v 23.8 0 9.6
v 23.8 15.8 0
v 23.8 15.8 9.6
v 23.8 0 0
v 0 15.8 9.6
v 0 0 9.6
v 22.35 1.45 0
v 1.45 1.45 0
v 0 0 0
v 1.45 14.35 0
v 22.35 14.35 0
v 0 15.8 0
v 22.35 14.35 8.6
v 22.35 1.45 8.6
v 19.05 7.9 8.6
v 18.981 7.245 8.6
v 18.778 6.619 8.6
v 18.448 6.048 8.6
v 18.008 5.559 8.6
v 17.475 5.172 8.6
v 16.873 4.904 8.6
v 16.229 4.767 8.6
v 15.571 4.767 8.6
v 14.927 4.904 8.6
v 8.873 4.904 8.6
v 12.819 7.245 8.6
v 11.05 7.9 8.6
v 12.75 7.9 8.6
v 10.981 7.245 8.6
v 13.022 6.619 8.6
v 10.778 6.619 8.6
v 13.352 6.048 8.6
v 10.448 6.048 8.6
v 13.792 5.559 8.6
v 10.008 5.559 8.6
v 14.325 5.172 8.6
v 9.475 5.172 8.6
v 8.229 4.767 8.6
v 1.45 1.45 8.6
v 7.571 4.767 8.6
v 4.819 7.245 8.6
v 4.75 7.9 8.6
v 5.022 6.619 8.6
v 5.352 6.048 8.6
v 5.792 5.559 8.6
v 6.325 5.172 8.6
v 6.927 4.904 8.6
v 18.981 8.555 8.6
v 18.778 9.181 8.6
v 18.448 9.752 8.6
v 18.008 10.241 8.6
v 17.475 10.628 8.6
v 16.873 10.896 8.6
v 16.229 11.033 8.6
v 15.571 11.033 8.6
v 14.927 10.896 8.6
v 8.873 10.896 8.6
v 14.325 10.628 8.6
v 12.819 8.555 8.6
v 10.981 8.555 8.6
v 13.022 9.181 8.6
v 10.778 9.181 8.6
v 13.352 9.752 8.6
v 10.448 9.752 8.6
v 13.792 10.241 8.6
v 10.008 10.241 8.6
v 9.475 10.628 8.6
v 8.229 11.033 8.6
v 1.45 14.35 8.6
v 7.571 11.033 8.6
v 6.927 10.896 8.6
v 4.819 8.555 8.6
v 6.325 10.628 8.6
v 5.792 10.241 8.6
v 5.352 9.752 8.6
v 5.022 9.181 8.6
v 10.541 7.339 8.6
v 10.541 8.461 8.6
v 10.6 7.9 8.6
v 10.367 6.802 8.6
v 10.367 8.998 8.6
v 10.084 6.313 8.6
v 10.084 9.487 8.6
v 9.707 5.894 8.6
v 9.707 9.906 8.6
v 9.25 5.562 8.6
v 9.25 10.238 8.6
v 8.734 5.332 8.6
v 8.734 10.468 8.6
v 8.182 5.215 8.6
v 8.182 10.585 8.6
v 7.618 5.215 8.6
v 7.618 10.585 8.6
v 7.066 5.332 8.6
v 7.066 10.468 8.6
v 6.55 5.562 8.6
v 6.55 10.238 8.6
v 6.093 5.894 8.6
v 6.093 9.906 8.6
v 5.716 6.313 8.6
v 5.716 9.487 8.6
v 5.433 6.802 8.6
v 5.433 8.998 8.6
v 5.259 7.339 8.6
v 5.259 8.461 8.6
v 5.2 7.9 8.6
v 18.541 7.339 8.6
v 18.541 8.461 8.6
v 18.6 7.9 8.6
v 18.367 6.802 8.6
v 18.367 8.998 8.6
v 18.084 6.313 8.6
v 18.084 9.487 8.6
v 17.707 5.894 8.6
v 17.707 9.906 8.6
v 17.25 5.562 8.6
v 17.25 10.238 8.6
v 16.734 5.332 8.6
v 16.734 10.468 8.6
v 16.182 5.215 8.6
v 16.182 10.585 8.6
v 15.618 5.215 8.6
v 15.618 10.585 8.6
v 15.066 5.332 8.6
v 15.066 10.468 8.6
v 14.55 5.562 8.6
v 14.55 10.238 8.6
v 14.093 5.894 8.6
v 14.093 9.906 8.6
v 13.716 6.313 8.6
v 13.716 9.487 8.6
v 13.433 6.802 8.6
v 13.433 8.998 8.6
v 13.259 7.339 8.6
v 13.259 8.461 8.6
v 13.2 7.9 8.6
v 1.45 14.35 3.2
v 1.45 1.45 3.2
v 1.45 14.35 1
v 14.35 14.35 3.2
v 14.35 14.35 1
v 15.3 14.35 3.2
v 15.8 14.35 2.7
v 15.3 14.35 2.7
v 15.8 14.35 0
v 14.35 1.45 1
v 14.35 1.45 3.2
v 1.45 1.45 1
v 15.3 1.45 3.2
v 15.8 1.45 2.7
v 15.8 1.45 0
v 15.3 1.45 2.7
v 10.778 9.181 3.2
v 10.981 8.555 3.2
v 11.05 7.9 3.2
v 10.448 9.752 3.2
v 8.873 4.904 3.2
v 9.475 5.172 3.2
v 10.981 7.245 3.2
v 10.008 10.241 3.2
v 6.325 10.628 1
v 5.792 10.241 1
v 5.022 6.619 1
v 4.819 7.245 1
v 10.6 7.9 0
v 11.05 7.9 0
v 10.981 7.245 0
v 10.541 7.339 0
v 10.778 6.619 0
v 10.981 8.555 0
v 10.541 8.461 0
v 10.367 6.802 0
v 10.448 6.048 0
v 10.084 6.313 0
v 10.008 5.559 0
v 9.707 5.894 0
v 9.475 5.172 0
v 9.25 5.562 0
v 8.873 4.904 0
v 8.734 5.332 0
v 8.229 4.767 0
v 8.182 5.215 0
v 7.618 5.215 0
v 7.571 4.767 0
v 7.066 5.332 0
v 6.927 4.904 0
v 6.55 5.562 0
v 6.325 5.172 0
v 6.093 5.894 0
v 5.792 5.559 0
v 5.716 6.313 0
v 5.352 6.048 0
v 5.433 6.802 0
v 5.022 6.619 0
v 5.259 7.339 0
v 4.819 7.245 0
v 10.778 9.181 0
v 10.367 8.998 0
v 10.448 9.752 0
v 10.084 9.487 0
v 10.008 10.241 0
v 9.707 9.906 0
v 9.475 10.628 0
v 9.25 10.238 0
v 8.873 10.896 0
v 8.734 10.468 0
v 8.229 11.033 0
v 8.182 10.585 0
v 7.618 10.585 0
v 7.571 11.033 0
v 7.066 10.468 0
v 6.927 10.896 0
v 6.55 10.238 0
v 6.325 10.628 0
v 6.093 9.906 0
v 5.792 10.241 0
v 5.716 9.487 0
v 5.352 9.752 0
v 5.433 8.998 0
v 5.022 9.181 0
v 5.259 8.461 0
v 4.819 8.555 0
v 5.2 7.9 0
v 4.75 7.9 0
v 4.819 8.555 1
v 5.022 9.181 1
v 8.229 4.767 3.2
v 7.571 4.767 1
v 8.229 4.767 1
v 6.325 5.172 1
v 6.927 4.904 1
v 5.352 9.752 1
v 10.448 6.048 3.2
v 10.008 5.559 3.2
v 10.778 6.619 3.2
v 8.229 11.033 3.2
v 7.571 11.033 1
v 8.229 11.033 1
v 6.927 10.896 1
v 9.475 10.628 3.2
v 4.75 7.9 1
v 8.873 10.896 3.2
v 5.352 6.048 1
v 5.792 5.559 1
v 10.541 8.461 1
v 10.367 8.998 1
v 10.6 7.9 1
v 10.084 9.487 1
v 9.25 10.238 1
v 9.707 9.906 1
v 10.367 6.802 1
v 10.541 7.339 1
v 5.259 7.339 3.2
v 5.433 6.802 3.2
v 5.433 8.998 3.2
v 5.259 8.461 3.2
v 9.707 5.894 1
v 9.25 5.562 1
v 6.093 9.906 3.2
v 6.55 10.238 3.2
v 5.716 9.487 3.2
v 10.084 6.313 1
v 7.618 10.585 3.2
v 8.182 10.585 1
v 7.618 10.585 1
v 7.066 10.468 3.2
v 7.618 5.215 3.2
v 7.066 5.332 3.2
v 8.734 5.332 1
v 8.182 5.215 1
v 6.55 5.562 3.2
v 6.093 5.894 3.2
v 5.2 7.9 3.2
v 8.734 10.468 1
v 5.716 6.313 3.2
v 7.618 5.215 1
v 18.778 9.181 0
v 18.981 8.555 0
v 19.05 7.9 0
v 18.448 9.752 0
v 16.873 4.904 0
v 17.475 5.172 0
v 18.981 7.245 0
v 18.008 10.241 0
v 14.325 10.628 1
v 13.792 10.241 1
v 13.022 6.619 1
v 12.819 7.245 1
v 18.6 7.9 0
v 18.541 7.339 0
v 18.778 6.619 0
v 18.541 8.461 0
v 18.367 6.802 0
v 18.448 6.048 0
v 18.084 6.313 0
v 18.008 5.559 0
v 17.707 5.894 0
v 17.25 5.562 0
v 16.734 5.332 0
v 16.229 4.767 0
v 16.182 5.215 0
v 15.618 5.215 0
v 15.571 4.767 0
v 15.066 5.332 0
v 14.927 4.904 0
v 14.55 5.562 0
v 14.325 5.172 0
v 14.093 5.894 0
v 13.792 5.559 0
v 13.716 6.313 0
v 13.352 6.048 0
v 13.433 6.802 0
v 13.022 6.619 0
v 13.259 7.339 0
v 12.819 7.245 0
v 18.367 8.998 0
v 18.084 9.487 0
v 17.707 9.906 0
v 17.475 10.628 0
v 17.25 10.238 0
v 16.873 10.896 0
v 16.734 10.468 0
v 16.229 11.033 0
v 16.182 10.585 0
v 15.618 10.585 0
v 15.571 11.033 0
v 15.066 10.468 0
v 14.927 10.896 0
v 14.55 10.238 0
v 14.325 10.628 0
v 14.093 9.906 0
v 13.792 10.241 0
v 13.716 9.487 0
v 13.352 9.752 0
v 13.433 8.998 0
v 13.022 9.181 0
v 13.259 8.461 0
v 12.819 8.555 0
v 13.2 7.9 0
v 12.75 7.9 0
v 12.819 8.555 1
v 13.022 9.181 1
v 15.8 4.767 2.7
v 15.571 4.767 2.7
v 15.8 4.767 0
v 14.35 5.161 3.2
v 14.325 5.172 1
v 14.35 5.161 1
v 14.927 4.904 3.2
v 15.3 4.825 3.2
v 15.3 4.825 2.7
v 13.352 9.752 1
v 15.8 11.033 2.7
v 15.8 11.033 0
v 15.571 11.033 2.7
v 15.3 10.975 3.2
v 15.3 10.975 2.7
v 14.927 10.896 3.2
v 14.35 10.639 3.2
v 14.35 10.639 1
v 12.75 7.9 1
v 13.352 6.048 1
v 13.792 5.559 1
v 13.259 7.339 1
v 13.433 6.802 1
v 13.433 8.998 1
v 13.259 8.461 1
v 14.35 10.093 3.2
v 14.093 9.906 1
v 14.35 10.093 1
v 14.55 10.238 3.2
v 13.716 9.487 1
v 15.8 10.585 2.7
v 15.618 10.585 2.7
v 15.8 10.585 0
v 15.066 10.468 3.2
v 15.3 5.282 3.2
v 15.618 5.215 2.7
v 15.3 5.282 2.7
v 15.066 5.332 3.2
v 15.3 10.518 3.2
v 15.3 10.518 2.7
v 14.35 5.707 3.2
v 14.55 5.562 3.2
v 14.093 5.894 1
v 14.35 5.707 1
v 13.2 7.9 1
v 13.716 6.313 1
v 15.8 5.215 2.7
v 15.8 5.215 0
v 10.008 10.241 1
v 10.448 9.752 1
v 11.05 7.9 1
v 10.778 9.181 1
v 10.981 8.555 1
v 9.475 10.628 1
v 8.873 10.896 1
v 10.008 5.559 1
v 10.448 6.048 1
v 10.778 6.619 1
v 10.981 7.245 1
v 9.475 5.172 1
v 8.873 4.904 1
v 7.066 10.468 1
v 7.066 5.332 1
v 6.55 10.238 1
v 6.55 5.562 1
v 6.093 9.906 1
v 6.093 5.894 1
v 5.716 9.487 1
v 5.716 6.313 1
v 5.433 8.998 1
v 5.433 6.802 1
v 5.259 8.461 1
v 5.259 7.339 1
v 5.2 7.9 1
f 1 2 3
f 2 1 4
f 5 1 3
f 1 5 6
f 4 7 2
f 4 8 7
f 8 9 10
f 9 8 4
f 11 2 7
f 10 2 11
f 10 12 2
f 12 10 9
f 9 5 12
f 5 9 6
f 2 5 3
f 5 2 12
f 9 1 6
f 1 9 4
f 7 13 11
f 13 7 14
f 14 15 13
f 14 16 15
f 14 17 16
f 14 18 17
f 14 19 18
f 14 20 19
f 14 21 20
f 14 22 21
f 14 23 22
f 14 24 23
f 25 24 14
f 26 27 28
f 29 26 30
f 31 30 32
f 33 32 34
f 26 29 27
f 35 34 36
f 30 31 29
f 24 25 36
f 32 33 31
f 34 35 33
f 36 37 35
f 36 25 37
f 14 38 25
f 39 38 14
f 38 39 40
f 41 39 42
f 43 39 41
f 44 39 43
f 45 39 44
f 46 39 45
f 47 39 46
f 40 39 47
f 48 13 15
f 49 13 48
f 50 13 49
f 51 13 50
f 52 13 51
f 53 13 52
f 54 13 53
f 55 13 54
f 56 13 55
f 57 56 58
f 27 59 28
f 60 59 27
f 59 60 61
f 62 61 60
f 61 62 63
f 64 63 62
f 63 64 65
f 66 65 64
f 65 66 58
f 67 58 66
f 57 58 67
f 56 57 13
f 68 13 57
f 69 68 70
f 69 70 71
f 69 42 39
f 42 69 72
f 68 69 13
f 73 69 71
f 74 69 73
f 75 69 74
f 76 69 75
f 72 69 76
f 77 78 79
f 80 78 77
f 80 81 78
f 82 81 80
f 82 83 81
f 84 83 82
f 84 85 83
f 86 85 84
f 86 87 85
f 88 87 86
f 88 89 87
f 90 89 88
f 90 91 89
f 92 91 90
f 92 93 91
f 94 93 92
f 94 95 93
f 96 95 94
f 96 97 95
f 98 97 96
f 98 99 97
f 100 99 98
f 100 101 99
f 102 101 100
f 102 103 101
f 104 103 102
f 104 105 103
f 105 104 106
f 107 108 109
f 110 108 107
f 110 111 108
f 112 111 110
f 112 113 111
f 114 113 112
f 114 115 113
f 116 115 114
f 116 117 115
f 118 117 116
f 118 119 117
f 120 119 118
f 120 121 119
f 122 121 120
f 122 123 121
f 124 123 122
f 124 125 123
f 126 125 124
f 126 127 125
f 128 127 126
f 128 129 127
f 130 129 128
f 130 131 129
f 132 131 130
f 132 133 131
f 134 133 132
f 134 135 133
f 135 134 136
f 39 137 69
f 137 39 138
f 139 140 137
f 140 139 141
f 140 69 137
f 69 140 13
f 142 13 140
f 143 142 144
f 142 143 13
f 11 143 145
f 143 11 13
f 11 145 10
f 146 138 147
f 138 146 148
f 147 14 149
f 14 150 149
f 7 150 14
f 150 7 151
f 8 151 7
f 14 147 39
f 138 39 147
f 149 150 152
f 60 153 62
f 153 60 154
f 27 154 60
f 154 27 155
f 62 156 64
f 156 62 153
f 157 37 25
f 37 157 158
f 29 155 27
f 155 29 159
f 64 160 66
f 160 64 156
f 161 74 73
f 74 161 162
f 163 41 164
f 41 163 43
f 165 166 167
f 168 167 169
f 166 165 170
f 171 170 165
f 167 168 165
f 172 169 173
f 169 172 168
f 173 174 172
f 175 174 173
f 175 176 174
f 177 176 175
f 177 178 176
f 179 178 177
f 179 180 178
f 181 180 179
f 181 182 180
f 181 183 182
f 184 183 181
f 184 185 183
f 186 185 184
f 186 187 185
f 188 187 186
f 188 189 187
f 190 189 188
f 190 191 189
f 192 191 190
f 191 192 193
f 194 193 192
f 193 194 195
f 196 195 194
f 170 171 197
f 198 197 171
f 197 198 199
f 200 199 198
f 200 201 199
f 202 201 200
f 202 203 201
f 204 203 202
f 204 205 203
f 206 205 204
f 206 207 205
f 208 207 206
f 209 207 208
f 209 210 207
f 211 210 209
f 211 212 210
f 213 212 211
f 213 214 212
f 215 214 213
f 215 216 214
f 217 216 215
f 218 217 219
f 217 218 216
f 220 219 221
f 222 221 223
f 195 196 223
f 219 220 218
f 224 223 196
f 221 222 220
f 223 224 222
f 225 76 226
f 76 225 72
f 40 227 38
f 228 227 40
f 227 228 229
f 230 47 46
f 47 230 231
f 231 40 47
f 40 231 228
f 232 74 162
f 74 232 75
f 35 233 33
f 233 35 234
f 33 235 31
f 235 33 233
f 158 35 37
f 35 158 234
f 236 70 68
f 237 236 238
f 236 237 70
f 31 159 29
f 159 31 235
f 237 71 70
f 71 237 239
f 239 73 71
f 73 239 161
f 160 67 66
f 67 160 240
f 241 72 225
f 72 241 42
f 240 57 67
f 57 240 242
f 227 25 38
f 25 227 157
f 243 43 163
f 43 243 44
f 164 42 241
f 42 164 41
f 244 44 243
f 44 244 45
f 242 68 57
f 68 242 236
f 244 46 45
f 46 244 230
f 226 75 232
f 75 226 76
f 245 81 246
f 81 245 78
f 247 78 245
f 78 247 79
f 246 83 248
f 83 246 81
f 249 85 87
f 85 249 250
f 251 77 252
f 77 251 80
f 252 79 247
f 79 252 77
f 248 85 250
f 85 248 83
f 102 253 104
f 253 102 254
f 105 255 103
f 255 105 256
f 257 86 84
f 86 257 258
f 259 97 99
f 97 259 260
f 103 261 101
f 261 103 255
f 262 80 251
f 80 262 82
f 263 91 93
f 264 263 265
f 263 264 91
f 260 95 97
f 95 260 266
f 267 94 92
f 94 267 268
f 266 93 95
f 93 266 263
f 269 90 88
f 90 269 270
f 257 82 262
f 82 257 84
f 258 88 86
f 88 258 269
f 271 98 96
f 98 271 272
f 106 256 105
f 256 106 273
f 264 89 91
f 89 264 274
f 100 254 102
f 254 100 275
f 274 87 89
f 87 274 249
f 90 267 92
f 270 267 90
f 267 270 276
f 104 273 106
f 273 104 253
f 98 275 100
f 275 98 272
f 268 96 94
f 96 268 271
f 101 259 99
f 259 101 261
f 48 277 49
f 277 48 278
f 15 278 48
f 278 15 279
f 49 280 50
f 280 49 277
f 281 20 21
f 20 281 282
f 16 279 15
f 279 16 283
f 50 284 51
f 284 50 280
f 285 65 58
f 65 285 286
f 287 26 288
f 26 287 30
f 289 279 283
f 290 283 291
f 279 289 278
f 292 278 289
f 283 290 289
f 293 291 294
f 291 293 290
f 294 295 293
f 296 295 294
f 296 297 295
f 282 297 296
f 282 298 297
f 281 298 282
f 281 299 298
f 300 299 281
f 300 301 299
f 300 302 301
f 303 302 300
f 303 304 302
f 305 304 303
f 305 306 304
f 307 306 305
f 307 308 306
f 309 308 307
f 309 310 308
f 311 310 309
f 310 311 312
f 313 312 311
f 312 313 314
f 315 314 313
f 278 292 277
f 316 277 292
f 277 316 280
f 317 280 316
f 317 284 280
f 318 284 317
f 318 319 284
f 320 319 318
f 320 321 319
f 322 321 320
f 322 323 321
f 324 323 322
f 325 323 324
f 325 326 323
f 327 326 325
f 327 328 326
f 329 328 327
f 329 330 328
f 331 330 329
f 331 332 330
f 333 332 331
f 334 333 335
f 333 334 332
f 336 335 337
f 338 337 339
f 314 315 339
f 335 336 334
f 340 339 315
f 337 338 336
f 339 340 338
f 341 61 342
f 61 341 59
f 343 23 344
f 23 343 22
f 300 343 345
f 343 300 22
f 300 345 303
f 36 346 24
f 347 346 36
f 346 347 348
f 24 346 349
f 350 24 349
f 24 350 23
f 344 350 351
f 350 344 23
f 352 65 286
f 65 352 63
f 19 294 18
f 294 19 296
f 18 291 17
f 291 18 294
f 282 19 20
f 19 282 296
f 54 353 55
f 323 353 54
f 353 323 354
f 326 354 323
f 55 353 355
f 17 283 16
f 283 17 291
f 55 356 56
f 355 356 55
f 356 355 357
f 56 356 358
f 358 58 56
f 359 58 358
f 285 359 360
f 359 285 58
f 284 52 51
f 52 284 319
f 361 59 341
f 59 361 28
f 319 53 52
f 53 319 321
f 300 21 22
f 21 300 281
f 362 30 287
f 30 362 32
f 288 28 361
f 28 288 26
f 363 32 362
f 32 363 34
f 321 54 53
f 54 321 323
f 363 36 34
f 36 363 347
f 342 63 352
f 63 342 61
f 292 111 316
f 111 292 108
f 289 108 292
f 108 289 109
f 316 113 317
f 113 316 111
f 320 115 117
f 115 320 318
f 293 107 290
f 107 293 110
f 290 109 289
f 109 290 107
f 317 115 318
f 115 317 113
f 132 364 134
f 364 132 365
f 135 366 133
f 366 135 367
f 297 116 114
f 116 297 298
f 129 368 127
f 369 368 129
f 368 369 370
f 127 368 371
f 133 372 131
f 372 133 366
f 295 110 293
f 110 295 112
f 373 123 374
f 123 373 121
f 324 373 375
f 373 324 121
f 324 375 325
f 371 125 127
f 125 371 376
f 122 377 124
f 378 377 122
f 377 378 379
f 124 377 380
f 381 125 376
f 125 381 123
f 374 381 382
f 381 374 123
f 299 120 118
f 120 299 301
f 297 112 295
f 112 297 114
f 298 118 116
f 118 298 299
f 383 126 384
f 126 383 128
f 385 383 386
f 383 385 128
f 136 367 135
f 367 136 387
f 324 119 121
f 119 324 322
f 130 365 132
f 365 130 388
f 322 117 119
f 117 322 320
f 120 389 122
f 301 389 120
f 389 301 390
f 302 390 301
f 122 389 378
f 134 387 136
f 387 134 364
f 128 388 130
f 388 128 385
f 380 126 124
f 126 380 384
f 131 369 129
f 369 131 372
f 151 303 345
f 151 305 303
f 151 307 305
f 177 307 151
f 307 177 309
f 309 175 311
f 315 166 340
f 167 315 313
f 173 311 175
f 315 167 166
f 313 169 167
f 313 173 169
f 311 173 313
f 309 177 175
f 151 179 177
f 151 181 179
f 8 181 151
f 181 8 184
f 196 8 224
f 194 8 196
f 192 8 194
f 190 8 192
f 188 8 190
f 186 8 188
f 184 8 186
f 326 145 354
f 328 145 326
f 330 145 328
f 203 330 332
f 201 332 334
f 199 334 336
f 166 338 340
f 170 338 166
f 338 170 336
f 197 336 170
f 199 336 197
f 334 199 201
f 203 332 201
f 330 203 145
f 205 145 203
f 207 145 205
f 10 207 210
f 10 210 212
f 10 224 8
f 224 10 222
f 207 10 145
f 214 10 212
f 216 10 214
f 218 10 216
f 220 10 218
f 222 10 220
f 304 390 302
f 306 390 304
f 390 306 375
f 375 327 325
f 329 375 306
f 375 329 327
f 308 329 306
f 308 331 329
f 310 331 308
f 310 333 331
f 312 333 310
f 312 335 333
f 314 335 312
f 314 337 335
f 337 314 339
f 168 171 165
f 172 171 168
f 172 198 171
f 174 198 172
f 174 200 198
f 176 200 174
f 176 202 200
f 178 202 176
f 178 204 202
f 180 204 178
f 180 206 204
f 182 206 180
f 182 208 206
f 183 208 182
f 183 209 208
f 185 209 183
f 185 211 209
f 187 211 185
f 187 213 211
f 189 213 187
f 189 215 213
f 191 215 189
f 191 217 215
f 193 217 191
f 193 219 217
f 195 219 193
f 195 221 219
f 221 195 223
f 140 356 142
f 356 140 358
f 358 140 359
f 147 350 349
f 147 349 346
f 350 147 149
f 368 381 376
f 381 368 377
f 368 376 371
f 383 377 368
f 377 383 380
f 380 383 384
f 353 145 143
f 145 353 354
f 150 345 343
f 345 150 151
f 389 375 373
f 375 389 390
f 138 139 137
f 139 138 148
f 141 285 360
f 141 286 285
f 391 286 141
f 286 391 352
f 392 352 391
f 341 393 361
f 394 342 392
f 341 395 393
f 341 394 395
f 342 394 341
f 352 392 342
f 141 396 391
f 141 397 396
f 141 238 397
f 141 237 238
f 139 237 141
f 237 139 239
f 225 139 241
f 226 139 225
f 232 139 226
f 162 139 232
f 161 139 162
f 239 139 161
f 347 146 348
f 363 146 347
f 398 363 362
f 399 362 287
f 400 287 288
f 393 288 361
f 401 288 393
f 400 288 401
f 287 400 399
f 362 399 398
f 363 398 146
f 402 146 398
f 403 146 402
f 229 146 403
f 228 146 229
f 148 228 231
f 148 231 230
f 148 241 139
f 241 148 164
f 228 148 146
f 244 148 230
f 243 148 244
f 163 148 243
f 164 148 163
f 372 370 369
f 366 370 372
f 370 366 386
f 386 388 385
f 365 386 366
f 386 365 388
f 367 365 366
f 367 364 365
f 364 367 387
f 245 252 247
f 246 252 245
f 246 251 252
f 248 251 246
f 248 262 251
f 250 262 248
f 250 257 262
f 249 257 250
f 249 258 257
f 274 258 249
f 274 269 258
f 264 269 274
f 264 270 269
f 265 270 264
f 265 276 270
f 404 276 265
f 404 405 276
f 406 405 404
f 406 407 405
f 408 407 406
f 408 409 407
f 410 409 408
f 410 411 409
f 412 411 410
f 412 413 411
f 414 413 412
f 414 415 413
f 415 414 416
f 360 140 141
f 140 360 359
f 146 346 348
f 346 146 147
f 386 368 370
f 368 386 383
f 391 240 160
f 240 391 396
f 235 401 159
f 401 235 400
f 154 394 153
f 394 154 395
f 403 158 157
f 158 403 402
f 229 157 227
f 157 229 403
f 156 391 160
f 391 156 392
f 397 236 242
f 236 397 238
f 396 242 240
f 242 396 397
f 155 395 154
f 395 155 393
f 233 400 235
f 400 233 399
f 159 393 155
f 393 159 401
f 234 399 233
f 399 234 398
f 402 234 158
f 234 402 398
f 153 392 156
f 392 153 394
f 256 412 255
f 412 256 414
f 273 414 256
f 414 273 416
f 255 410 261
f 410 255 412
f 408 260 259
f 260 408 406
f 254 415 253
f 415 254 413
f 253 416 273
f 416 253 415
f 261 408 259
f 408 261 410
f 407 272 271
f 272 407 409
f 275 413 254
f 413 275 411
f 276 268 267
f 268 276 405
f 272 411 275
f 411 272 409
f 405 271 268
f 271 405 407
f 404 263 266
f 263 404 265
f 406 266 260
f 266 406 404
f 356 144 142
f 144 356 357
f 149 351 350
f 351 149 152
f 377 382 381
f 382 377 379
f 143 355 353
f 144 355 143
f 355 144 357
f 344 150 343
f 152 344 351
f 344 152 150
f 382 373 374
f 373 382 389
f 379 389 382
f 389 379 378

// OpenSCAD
// file: posts.scad
/**
 * Derived from http://www.thingiverse.com/thing:5699
 * LEGO, the LEGO logo, the Brick, DUPLO, and MINDSTORMS are trademarks of the LEGO Group. 2012 The LEGO Group.
 */

include <common.scad>

module posts(real_width, real_length, real_height, overall_width, overall_length) {
  if (real_width > 1 && real_length > 1) {
    _posts(real_width, real_length, real_height, overall_width, overall_length);
  } else if (real_width == 1 && real_length > 1) {
    pins(real_width, real_length, real_height, overall_width, overall_length);
  }
}

module _posts(real_width, real_length, real_height, overall_width, overall_length) {
  
  // LEGO standard dimensions, but adjusted for brick params
  total_posts_length = (post_diameter * (real_length - 1)) + ((real_length - 2) * (stud_spacing - post_diameter));
  total_posts_width = (post_diameter * (real_width - 1)) + ((real_width - 2) * (stud_spacing - post_diameter));
  
  translate([post_diameter / 2, post_diameter / 2, 0]) {
    translate([(overall_length - total_posts_length) / 2, (overall_width - total_posts_width) / 2, 0]) {
      union() {
        // Posts
        for (ycount = [1 : real_width - 1]) {
          for (xcount = [1 : real_length - 1]) {
            translate([(xcount - 1) * stud_spacing, (ycount - 1) * stud_spacing, 0]) 
            post(real_height);
          }
        }
      }
    }
  }
}

module post(real_height) {
  difference() {
    cylinder(r = post_diameter / 2, 
             h = real_height * block_height, 
             $fs = cylinder_precision);
    // remove the inside
    translate([0, 0, -(post_wall_thickness + 0.05)]) 
    cylinder(r = (post_diameter / 2) - post_wall_thickness, 
             h = real_height * block_height + 1,
             $fs = cylinder_precision);
  }
}

module pins(real_width, real_length, real_height, overall_width, overall_length) {
  
  // LEGO standard dimensions, but adjusted for brick params
  total_pins_width = (pin_diameter * (real_width - 1)) + max(0, ((real_width - 2) * (stud_spacing - pin_diameter)));
  total_pins_length = (pin_diameter * (real_length - 1)) + max(0, ((real_length - 2) * (stud_spacing - pin_diameter)));

  translate([(pin_diameter / 2) + (overall_length - total_pins_length) / 2, overall_width / 2, 0]) {
    for (xcount = [1 : real_length - 1]) {
      translate([(xcount - 1) * stud_spacing, 0, 0]) 
      cylinder(r = pin_diameter / 2,
               h = block_height * real_height,
               $fs = cylinder_precision);
    }
  }
}
// file: block.scad
/**
 * Derived from http://www.thingiverse.com/thing:5699
 *
 * LEGO, the LEGO logo, the Brick, DUPLO, and MINDSTORMS are trademarks of the LEGO Group. 2012 The LEGO Group.
 */

include <common.scad>
include <posts.scad>

block(2, 3, 1);

module block(width, length, height) {
  // calculate real dimensions based on stud count
  real_height = max(1/3, height);
  real_length = max(width, length);
  real_width = min(width, length);
  overall_length = (real_length * stud_spacing) - (2 * wall_play);
  overall_width = (real_width * stud_spacing) - (2 * wall_play);
  
  union() {
    difference() {
      // brick mass
      cube([overall_length, overall_width, real_height * block_height]);
      // curve out
      translate([wall_thickness, wall_thickness, -roof_thickness]) 
      cube([overall_length - wall_thickness * 2, overall_width - wall_thickness * 2, block_height * real_height]);
    }
    // underneath posts or pins
    posts(real_width, real_length, real_height, overall_width, overall_length);
  }
}
// file: common.scad
/**
 * Derived from http://www.thingiverse.com/thing:5699
 *
 * LEGO, the LEGO logo, the Brick, DUPLO, and MINDSTORMS are trademarks of the LEGO Group. 2012 The LEGO Group.
 */

// LEGO standard dimensions - (no duplos)
// heights
block_height = 9.6;
plate_height = 9.6 / 3;

// pins and posts 
cylinder_precision = 0.1;
pin_diameter = 3.2;
post_diameter = 6.3;
post_wall_thickness = 0.45;

roof_thickness = 1;

stud_spacing = 8;

wall_play = 0.1;
wall_thickness = 1.45;


//
// cool hash function for structs
// dog = [
//  "fur", "black",
//  "legs", 4
// ];
// hash( dog, "legs")
//
function hash(h,k)= ( h[search([k], [for(i=[0:2:len(h)-2])h[i]])[0]*2+1] ); 
// main file
/**
 * Derived from http://www.thingiverse.com/thing:5699
 *
 * LEGO, the LEGO logo, the Brick, DUPLO, and MINDSTORMS are trademarks of the LEGO Group. 2012 The LEGO Group.
 */

include <common.scad>
include <block.scad>

tile(2, 2);

// there is a small groove on the bottom of tiles that helps pry them up
groove_depth = 0.50;
groove_height = 0.50;


module tile(width, length) {
  // tiles are locked to 1/3 height
  height = 1/3;
  
  // calculate real dimensions based on stud count
  real_height = max(1/3, height);
  real_length = max(width, length);
  real_width = min(width, length);
  overall_length = (real_length * stud_spacing) - (2 * wall_play);
  overall_width = (real_width * stud_spacing) - (2 * wall_play);
  
  // flip tile upside down
  translate([overall_length, 0, block_height * height]) // put tile at 0 0 once flipped
  rotate([0, 180, 0]) // flip tiles upside down
  difference() {
    // basic rectangle brick
    block(width, length, height);
    
    // remove groove around bottom of brick, so easier to remove (newer style tile)
    cube([groove_depth, overall_width, groove_height]);
    cube([overall_length, groove_depth, groove_height]);
    translate([overall_length - groove_depth, 0, 0])
    cube([groove_depth, overall_width, groove_height]);
    translate([0, overall_width - groove_depth, 0])
    cube([overall_length, groove_depth, groove_height]);
  }
}
